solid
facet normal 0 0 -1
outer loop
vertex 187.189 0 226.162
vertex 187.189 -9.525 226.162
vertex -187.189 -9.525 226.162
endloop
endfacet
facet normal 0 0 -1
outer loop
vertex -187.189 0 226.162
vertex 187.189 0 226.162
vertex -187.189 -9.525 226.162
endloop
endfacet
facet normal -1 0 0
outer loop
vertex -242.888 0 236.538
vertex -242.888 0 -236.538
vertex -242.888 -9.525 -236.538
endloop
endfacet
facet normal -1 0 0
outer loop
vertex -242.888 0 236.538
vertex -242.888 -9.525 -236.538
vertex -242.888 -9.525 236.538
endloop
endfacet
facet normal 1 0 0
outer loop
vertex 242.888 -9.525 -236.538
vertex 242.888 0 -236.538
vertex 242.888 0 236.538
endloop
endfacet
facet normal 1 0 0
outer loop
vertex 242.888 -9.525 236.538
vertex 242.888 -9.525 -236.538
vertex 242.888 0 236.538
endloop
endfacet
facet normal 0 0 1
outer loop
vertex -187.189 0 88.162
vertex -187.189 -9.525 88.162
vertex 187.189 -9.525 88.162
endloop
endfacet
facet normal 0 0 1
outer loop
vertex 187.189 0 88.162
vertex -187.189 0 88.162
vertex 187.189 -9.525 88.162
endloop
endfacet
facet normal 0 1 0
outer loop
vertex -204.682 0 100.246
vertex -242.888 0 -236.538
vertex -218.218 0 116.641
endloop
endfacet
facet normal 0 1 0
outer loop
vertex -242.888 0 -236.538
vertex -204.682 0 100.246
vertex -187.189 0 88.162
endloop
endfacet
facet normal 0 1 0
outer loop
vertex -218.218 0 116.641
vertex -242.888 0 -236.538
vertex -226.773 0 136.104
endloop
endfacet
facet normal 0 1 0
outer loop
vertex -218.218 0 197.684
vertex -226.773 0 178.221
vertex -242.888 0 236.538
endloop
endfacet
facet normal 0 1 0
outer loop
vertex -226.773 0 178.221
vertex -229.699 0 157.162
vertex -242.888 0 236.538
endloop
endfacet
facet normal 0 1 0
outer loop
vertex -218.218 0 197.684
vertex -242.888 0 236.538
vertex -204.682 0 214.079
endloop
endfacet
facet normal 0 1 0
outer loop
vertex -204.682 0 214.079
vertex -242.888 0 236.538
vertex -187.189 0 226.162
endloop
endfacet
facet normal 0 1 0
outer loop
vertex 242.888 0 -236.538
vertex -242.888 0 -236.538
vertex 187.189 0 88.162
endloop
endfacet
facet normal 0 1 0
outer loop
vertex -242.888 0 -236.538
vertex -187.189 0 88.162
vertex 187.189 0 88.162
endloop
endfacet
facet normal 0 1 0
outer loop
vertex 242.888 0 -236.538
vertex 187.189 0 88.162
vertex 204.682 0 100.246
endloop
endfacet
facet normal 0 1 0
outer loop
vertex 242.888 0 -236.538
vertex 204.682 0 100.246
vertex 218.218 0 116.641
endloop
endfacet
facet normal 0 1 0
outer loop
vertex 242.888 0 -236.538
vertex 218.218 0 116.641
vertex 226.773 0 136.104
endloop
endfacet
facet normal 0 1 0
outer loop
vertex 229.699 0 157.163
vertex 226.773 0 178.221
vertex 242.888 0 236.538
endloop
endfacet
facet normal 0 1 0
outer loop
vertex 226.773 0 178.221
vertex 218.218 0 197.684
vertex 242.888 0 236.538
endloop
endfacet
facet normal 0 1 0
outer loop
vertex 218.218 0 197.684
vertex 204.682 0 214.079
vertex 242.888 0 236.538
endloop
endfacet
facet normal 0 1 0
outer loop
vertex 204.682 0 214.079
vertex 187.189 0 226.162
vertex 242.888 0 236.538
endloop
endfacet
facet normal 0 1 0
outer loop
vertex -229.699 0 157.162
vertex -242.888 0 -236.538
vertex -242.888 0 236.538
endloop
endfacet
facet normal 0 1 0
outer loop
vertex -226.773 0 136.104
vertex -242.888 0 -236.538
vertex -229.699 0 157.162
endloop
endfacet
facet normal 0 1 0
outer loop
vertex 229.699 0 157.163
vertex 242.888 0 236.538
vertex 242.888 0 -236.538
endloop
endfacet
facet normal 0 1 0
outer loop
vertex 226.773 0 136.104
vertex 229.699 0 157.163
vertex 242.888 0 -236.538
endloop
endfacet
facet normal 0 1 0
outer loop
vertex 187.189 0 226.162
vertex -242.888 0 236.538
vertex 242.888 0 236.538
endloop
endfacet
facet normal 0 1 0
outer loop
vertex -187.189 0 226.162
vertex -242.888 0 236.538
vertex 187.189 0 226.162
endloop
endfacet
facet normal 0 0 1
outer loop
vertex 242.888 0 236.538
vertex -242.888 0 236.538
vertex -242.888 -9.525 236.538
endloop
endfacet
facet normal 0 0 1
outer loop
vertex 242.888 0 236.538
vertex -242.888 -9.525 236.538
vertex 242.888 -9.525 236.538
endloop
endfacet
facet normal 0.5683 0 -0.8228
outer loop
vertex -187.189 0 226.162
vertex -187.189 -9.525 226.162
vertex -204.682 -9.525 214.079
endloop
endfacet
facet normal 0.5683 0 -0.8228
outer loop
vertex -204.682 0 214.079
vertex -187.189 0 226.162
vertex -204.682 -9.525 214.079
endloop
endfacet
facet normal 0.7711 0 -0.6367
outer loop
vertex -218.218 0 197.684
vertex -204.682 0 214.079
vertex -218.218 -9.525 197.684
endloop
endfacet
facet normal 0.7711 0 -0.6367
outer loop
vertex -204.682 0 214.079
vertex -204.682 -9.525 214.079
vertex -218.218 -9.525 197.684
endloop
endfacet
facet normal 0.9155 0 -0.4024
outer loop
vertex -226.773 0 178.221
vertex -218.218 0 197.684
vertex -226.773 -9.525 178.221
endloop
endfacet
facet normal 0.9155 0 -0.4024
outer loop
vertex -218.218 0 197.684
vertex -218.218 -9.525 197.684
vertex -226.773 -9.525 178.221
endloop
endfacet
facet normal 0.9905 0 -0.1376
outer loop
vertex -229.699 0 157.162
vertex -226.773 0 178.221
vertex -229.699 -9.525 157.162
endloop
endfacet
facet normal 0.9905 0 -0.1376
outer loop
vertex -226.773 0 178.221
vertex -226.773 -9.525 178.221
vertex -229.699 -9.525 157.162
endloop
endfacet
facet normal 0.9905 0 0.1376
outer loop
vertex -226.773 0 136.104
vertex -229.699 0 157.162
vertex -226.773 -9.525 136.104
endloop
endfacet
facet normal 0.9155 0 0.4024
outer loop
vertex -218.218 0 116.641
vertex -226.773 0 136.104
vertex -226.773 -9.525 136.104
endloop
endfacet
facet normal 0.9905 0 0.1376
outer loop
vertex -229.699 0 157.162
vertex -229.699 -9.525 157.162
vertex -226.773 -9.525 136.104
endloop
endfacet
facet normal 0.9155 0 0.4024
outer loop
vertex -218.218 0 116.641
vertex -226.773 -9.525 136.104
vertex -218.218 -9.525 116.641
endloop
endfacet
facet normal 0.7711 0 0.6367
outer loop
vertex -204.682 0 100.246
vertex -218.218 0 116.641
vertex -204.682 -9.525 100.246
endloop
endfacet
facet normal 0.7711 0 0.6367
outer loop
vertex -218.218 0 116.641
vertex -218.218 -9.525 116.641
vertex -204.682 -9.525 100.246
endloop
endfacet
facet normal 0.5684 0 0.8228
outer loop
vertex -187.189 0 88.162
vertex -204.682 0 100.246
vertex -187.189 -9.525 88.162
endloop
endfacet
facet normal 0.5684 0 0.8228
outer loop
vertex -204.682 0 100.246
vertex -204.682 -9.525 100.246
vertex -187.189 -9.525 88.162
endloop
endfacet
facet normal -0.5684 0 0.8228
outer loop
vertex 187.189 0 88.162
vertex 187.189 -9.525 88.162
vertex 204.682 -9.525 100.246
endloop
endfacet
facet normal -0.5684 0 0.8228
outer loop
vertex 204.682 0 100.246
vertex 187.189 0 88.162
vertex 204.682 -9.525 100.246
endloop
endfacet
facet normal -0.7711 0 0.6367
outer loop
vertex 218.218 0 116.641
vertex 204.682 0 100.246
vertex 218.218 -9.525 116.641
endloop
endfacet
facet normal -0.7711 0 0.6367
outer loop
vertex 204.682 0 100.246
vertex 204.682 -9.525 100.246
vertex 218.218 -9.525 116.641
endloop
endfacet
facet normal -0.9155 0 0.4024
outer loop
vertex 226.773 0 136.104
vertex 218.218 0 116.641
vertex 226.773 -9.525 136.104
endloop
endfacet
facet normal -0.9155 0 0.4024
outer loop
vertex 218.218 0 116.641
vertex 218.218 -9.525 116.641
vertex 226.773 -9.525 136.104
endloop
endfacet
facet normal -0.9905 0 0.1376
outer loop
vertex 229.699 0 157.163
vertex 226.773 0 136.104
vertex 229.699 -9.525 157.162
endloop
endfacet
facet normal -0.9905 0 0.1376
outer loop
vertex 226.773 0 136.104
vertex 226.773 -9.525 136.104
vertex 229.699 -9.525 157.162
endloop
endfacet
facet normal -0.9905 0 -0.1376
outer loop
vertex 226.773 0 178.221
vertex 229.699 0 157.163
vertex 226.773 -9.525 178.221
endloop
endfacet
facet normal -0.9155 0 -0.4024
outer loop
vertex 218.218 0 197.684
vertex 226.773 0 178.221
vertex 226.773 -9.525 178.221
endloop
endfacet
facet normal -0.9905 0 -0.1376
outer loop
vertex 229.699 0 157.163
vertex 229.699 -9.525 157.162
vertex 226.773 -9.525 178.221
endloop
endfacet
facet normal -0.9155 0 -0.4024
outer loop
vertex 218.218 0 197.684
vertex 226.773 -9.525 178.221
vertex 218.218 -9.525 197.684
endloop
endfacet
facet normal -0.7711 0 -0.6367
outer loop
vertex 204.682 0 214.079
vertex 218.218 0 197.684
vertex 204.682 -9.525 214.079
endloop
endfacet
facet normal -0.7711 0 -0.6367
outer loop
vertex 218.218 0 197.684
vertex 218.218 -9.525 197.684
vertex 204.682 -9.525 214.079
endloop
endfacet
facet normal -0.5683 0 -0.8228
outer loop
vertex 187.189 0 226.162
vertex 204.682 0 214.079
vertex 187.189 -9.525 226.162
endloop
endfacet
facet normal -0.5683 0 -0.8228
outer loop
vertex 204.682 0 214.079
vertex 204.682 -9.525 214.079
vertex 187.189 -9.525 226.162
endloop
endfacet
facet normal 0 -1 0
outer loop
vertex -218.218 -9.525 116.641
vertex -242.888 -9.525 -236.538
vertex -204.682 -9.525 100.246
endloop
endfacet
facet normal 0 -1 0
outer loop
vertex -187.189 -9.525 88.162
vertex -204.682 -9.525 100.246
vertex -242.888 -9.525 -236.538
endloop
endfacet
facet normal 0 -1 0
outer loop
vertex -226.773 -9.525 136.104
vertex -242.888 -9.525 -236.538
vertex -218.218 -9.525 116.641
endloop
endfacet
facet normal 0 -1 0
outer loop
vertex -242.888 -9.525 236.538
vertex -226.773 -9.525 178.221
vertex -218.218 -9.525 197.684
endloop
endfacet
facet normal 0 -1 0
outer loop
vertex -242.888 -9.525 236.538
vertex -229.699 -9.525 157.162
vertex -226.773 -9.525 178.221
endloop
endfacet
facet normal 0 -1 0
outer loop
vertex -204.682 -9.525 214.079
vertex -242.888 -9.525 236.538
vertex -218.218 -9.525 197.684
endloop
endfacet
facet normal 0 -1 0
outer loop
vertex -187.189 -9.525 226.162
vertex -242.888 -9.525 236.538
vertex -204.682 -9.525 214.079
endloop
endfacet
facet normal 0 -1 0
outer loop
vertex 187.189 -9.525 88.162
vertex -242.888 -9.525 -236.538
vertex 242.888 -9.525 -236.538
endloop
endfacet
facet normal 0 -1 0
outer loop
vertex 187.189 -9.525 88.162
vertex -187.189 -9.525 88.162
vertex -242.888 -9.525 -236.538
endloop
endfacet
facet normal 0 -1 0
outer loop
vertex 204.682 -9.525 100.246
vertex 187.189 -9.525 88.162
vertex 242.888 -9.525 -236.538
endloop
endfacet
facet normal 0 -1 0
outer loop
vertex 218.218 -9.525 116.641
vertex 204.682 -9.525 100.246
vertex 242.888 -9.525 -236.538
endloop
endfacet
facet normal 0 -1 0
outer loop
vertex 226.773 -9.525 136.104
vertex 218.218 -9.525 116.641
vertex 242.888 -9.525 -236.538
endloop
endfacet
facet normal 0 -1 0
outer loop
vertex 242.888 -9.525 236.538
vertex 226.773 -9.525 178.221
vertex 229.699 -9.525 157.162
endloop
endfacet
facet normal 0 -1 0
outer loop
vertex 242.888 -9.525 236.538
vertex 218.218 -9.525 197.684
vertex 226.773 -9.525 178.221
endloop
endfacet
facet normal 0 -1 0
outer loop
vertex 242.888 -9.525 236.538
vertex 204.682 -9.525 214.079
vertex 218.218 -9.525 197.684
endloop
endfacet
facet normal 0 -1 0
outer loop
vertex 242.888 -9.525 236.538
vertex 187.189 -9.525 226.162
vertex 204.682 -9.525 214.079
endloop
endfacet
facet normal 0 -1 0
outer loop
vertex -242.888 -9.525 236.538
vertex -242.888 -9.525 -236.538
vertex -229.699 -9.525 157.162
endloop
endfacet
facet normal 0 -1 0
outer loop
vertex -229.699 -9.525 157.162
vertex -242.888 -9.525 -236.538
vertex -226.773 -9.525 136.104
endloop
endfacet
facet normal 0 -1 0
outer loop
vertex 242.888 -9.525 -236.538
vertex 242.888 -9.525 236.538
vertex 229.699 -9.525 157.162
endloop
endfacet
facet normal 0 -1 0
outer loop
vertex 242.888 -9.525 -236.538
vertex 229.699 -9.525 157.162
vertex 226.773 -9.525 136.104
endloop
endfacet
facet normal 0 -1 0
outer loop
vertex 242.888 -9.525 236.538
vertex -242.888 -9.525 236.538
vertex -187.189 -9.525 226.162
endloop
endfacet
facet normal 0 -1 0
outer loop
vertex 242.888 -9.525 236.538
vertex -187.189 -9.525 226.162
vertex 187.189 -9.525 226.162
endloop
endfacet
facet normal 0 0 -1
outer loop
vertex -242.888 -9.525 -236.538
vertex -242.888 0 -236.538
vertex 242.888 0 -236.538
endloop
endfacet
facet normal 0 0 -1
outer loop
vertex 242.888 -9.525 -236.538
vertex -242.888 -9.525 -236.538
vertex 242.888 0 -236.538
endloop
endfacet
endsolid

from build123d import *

# Parameters (mm, degrees)
F0_W     = 485.775
F0_H     = 473.075
F1_DEPTH = 9.525
F3_D     = 109.982
F4_DEPTH = 25.4


with BuildPart() as f1:
    # F0 (on Front) → F1 (new body)
    with BuildSketch(Plane.XZ):
        Rectangle(F0_W, F0_H)
    extrude(amount=F1_DEPTH)

    # F3 (through all)
    with Locations(Plane.XZ.offset(9.525)):
        with Locations((0, 157.1625)):
            Hole(F3_D / 2)

    # F2 (on face) → F4 (cut)
    with BuildSketch(Plane.XZ.offset(9.525)):
        with BuildLine():
            Line((-152.444478, 226.1625), (-187.189204, 226.1625))
            ThreePointArc((-187.189204, 226.1625), (-229.698578, 157.1625), (-187.189204, 88.1625))
            Line((-187.189204, 88.1625), (-152.444478, 88.1625))
            Line((-152.444478, 88.1625), (152.444478, 88.1625))
            Line((152.444478, 88.1625), (187.189204, 88.1625))
            ThreePointArc((187.189204, 88.1625), (229.698578, 157.1625), (187.189204, 226.1625))
            Line((187.189204, 226.1625), (152.444478, 226.1625))
            Line((152.444478, 226.1625), (-152.444478, 226.1625))
        make_face()
    extrude(amount=-F4_DEPTH, mode=Mode.SUBTRACT)


solid = f1.part
